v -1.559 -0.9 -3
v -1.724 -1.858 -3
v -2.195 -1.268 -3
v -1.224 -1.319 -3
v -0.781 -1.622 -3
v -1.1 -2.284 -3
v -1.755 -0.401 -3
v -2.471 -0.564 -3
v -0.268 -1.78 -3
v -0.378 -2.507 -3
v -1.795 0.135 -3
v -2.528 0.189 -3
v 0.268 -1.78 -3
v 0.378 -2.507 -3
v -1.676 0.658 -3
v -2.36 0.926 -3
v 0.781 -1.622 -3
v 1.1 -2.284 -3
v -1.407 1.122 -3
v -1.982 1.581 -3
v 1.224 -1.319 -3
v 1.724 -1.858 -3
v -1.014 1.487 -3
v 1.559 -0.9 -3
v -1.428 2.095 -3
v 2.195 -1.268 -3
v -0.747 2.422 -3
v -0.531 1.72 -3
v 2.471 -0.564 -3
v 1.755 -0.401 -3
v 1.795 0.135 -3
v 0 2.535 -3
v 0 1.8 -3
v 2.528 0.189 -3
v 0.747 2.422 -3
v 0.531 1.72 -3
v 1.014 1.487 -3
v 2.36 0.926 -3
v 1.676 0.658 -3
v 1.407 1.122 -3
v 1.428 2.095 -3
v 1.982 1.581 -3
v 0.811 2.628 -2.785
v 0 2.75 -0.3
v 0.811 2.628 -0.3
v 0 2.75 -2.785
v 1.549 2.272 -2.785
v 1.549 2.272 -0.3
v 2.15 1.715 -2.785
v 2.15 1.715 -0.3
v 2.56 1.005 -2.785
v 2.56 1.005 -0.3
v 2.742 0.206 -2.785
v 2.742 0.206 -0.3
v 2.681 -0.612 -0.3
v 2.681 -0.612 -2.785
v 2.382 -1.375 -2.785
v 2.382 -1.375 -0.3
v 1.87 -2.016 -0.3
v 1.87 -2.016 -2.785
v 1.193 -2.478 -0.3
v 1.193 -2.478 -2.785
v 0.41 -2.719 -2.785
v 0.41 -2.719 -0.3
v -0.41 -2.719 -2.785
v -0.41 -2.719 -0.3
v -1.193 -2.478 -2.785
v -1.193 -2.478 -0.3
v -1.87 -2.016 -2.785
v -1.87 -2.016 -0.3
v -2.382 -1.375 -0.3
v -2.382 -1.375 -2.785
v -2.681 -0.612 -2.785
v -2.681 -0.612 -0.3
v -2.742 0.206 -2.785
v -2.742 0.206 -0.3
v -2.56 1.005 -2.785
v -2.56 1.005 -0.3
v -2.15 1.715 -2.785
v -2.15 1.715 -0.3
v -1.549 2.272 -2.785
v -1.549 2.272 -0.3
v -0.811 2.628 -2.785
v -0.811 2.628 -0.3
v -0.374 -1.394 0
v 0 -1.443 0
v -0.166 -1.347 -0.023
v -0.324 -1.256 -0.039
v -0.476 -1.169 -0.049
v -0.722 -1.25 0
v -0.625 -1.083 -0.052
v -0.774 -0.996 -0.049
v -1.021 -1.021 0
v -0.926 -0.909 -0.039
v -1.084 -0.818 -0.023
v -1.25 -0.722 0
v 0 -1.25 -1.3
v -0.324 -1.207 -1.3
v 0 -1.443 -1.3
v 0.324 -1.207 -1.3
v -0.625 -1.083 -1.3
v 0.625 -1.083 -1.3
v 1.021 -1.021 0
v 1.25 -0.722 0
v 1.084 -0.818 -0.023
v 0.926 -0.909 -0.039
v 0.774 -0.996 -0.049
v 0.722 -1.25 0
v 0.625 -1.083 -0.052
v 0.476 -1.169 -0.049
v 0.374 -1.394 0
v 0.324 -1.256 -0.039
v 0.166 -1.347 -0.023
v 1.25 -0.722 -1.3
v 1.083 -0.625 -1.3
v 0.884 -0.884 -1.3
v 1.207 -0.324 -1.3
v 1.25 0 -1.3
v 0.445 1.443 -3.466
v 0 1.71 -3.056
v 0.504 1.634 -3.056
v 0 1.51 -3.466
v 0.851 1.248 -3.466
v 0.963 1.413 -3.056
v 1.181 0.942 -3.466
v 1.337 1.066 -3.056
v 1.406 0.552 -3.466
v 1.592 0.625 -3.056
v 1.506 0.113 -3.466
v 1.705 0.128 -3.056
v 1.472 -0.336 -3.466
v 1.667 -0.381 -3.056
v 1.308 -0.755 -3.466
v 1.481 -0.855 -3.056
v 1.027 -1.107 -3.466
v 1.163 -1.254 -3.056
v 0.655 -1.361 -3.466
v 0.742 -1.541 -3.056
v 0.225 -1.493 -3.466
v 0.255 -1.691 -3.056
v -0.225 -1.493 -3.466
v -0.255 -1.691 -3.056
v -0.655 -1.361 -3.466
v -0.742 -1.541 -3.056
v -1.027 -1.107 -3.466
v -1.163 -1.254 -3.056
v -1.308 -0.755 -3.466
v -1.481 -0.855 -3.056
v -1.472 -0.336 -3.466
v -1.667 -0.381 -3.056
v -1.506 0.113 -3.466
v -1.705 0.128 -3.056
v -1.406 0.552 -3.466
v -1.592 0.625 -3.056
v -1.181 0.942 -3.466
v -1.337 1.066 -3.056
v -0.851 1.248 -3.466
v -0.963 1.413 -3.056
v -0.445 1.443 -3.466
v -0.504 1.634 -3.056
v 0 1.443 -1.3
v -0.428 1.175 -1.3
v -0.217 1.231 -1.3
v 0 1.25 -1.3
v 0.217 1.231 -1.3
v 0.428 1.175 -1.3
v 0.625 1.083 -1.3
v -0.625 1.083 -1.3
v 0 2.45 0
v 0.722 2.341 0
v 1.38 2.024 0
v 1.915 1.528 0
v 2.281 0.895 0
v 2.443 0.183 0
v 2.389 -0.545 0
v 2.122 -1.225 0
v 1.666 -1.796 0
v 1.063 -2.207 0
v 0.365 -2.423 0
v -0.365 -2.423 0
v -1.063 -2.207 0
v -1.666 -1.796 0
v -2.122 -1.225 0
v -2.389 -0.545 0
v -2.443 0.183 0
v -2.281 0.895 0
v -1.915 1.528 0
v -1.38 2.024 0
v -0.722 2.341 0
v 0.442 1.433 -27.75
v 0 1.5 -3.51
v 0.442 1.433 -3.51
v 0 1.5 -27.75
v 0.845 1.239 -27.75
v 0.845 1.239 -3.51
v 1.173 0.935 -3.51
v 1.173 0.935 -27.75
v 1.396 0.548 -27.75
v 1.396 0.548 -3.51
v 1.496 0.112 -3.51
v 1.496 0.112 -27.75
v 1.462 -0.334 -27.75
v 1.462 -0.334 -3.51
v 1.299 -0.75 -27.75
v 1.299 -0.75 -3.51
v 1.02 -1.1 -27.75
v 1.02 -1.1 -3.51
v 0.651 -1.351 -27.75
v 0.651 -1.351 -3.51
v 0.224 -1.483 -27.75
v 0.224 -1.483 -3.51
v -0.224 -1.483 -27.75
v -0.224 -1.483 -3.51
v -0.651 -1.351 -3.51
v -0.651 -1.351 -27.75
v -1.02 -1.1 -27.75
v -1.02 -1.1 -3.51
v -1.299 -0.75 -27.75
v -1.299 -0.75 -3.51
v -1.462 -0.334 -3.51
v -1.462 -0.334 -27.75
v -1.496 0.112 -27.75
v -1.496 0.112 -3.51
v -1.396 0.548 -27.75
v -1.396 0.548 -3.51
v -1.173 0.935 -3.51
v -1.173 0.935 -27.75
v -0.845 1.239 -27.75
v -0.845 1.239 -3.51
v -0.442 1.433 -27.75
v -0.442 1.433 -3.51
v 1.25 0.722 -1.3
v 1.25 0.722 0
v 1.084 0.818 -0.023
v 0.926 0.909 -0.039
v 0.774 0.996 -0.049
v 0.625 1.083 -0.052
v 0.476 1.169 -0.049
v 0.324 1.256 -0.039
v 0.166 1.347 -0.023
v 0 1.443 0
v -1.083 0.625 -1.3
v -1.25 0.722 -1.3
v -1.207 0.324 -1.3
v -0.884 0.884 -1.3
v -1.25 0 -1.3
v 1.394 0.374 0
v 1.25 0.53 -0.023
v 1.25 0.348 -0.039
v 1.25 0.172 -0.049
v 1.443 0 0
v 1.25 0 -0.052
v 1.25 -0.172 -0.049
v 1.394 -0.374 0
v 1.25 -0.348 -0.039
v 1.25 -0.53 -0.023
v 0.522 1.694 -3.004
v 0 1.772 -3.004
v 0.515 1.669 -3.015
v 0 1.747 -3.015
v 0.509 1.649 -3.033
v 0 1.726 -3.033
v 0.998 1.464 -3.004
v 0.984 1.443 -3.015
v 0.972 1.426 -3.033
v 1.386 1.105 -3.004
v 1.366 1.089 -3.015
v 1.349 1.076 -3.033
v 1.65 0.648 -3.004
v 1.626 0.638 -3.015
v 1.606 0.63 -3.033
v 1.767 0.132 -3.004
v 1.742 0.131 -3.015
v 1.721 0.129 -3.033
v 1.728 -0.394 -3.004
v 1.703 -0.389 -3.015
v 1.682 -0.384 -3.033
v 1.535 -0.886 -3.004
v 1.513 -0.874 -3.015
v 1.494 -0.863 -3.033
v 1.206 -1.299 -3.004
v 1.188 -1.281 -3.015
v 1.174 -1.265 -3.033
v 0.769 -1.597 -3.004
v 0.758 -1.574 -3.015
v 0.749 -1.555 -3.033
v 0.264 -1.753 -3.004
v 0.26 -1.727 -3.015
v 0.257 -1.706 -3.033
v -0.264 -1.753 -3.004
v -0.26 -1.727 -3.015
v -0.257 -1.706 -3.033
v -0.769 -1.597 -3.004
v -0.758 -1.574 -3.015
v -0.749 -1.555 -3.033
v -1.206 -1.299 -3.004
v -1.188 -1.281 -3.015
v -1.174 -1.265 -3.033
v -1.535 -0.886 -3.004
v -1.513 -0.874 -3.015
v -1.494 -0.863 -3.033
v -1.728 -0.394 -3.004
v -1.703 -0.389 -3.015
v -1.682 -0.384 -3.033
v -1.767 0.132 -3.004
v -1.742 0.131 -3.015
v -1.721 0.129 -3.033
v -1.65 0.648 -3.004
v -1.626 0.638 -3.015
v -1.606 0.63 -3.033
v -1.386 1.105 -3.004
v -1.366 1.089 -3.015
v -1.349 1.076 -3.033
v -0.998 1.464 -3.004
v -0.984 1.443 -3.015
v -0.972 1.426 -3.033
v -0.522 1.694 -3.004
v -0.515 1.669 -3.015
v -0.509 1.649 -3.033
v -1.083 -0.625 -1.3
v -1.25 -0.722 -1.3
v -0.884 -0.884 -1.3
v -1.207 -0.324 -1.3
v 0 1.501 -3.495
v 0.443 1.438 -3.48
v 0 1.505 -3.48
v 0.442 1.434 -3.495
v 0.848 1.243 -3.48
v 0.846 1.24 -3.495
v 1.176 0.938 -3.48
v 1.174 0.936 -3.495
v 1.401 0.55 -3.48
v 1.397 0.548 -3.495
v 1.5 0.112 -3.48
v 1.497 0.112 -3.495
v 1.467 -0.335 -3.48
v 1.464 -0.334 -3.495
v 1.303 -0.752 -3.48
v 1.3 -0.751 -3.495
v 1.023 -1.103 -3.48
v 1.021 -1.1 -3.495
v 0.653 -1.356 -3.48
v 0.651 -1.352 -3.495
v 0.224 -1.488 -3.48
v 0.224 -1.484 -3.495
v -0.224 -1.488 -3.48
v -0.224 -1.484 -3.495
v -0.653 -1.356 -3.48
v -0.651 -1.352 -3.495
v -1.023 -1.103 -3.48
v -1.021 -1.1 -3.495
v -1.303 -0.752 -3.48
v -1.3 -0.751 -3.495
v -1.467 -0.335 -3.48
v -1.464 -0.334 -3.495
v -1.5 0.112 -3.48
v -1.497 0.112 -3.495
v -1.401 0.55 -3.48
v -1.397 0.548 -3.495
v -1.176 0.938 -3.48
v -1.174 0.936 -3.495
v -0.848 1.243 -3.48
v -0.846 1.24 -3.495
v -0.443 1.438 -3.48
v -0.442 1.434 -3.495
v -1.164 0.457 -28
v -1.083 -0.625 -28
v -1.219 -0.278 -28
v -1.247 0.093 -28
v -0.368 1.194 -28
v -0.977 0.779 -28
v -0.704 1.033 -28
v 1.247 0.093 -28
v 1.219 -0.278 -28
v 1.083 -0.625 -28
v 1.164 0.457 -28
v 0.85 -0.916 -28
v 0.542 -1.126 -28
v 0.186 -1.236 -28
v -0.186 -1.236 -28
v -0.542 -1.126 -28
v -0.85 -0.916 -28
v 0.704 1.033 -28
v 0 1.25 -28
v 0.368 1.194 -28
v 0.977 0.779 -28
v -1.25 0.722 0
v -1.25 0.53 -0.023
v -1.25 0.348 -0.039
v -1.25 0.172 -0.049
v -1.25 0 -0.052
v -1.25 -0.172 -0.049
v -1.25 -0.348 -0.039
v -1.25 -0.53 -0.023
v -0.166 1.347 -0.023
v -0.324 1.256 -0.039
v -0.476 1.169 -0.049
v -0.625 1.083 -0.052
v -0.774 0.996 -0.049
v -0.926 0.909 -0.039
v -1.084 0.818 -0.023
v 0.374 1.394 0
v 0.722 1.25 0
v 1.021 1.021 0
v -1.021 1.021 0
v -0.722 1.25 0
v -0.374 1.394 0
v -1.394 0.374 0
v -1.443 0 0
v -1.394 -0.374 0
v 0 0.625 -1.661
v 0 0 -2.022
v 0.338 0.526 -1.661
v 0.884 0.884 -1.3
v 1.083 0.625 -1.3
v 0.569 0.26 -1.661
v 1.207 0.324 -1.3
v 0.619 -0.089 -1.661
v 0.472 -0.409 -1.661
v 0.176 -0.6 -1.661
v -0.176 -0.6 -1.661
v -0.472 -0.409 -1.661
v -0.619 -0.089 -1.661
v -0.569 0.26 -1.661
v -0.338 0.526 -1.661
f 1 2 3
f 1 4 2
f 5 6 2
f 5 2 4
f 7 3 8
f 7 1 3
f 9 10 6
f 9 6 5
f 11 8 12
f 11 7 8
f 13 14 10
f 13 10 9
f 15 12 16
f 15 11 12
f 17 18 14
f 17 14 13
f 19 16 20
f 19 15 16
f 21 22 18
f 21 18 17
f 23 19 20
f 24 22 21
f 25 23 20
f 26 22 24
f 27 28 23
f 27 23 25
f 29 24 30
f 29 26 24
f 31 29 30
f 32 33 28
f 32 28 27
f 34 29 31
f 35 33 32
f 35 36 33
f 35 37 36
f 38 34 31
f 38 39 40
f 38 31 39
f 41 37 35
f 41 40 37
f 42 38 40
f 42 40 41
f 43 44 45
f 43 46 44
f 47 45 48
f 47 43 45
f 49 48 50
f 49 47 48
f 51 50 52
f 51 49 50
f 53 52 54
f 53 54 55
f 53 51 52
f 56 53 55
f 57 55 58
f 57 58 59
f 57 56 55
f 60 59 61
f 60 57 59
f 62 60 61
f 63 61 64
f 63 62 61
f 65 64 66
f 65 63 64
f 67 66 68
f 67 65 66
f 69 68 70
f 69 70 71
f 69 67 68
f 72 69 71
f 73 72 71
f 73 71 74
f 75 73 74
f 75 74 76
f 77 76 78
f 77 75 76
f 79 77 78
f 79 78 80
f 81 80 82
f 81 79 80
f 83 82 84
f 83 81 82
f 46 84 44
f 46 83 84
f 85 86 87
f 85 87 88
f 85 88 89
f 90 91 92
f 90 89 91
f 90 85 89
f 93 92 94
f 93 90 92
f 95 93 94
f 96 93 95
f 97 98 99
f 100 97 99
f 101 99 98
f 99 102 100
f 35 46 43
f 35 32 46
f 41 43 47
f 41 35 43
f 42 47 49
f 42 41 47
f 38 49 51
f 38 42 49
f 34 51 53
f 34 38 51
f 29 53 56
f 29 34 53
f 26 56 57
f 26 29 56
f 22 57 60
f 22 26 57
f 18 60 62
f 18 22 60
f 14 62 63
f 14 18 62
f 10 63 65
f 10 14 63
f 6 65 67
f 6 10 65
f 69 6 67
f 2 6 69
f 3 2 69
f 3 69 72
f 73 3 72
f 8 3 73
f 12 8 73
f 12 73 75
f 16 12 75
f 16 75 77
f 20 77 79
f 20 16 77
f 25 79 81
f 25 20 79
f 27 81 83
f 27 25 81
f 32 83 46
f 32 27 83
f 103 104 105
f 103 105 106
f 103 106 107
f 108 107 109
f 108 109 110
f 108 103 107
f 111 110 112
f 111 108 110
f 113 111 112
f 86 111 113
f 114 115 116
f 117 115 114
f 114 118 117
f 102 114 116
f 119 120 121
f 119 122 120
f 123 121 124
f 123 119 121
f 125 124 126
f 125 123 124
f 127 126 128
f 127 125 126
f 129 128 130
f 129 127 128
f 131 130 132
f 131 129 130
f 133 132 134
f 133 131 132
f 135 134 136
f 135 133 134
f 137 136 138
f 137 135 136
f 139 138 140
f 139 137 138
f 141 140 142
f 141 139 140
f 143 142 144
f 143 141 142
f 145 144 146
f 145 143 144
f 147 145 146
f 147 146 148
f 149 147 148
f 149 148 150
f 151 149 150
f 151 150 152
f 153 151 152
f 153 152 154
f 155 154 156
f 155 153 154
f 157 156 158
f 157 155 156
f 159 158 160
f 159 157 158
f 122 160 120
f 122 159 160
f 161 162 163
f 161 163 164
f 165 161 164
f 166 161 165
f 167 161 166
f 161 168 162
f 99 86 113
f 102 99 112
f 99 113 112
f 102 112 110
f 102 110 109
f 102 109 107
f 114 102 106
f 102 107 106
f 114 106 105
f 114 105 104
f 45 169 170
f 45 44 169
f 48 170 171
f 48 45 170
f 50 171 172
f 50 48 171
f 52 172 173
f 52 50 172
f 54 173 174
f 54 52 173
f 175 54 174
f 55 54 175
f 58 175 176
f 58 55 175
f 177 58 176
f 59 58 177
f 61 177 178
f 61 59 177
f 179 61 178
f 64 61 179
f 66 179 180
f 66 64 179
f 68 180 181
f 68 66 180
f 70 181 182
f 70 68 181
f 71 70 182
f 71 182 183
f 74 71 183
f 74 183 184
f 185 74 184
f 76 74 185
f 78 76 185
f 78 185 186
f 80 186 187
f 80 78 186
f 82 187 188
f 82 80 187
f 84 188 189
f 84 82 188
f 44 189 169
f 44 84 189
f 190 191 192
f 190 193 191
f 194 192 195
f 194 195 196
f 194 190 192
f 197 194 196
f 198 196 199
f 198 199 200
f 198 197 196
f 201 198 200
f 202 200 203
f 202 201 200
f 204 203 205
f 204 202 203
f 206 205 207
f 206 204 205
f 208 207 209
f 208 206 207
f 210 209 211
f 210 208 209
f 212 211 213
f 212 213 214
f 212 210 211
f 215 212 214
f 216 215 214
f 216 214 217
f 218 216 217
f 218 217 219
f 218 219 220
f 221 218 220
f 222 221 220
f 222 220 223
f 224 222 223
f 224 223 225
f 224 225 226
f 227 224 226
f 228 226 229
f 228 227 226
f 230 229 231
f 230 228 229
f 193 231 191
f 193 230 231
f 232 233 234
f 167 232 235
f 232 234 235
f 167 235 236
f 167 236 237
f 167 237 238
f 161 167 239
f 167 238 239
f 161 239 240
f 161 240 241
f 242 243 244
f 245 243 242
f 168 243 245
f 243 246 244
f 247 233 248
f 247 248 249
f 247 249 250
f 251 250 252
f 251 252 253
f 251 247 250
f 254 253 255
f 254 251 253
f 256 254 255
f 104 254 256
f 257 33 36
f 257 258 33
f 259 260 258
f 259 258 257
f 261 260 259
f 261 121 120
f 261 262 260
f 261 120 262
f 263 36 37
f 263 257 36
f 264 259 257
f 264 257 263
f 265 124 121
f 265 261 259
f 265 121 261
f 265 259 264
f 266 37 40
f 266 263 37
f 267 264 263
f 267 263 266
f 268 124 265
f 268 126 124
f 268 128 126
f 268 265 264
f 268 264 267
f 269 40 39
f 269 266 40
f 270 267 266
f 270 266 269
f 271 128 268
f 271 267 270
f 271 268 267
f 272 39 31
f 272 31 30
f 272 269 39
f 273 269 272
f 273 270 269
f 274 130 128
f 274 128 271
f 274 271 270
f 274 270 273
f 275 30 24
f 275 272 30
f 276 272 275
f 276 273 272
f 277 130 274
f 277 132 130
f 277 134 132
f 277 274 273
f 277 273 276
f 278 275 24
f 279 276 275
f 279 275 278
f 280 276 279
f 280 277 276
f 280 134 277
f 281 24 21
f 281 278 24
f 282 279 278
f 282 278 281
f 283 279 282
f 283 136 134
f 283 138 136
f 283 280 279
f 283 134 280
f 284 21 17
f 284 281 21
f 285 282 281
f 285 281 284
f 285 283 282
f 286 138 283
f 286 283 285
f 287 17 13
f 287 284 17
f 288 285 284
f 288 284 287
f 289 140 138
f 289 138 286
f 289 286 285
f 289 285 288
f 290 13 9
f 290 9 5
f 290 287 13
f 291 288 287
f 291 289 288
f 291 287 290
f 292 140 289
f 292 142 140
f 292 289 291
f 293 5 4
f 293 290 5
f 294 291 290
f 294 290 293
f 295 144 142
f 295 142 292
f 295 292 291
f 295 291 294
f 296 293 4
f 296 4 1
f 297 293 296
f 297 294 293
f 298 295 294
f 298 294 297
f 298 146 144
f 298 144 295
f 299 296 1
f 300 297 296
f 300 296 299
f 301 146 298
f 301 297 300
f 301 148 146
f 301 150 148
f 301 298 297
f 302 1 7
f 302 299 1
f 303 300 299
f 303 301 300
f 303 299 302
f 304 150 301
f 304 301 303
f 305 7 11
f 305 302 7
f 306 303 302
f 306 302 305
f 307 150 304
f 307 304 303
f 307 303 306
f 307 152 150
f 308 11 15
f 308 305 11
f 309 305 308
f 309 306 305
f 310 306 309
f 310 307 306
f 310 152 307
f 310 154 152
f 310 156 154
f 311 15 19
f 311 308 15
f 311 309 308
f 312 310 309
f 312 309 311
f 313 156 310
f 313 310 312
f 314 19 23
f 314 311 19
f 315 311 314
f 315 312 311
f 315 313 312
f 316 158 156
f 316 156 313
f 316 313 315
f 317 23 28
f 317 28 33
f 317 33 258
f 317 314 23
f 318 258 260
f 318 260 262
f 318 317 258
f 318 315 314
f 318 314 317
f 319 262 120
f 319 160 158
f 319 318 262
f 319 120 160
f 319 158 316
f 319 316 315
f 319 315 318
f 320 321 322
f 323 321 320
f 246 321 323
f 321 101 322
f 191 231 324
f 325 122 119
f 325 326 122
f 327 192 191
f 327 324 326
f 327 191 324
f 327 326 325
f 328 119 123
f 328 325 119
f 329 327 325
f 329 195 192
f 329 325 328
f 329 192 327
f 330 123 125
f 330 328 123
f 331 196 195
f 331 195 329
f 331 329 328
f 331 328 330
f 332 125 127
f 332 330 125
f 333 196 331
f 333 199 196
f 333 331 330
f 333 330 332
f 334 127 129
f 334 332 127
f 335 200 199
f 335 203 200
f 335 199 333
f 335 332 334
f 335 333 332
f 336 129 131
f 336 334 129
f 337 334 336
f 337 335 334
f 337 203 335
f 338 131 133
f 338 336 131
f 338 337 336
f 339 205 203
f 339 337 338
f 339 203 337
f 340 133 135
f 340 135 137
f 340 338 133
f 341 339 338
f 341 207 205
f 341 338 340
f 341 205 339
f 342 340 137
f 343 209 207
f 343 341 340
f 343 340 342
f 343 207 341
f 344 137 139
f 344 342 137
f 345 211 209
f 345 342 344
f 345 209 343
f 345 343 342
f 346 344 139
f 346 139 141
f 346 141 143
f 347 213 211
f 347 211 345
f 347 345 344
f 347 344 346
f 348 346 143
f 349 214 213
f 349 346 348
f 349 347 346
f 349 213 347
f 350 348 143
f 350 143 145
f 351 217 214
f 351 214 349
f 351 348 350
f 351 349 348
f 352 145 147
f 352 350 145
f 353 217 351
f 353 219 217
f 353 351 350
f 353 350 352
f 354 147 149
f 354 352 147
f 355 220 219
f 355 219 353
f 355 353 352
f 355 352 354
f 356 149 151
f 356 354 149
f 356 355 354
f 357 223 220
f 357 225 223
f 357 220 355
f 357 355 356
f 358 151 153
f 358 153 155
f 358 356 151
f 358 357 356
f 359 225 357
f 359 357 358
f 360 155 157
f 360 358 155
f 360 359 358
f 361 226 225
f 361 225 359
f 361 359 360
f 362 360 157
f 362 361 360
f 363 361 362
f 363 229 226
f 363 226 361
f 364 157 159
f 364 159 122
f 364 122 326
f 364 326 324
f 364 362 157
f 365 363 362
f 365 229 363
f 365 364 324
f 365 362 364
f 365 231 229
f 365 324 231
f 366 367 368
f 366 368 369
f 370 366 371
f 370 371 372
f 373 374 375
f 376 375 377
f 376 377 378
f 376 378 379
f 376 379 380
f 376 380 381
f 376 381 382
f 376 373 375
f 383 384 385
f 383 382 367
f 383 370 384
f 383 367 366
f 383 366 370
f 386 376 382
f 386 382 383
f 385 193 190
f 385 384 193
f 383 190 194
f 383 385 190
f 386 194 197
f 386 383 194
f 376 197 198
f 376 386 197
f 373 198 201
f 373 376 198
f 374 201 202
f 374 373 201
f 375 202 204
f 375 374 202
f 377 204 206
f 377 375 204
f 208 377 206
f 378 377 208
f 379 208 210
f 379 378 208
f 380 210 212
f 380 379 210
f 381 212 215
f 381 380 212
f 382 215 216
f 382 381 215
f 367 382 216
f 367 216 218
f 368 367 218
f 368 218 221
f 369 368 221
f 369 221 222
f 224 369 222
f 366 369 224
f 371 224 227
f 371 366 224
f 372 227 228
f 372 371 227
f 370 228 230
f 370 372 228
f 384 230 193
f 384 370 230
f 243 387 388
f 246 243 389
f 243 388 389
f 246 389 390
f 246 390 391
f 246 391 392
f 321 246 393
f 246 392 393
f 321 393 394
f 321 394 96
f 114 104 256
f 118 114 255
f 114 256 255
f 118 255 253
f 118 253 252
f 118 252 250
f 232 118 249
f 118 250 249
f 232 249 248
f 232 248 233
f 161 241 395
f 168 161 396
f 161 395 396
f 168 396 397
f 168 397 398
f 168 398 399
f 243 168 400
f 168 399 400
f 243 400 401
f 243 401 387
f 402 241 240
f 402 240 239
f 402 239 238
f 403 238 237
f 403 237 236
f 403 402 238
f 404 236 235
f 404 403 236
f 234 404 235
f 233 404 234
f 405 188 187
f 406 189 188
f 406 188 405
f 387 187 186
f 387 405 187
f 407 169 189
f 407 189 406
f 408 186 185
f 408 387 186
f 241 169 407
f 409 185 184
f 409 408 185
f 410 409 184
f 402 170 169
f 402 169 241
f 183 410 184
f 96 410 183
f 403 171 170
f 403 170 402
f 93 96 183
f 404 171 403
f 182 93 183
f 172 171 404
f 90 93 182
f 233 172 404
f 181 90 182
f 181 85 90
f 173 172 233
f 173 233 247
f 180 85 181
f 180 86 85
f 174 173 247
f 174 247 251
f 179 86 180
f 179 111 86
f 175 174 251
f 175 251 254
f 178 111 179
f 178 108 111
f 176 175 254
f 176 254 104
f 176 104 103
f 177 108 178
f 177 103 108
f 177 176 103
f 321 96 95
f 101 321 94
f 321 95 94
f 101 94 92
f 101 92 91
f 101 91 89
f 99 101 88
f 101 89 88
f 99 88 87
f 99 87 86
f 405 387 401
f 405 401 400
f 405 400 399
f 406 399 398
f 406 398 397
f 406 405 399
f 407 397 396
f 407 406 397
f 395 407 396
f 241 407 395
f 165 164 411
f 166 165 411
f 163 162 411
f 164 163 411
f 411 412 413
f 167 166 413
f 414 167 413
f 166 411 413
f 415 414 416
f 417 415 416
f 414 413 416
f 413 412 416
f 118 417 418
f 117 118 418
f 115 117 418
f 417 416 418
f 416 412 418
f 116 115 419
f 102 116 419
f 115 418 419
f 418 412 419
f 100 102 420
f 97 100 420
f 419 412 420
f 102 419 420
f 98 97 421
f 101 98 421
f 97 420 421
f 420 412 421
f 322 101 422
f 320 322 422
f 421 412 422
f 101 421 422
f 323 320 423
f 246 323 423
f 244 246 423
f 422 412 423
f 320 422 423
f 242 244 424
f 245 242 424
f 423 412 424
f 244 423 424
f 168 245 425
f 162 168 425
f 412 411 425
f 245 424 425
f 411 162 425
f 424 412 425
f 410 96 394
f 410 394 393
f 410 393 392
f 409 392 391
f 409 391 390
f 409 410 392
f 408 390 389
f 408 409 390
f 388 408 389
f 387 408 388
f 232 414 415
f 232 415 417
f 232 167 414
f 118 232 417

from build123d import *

# Parameters (mm, degrees)
CUT_EXTRUDE1_DEPTH = 1.3


with BuildPart() as part:
    # Sketch1 → Revolve1 (revolve)
    with BuildSketch(Plane(origin=(0, 0, 0), x_dir=(0, 0, -1), z_dir=(1, 0, 0))):
        with BuildLine():
            Line((0, 0), (0, 2.45))
            Line((0, 2.45), (0.3, 2.75))
            Line((0.3, 2.75), (2.785, 2.75))
            Line((2.785, 2.75), (3, 2.535))
            Line((3, 2.535), (3, 1.8))
            ThreePointArc((3, 1.8), (3.015193643, 1.74701055), (3.056157637, 1.710123155))
            Line((3.056157637, 1.710123155), (3.466157637, 1.510123155))
            ThreePointArc((3.466157637, 1.510123155), (3.48750205, 1.50256365), (3.51, 1.5))
            Line((3.51, 1.5), (27.75, 1.5))
            Line((27.75, 1.5), (28, 1.25))
            Line((28, 1.25), (28, 0))
            Line((28, 0), (0, 0))
        make_face()
    revolve(axis=Axis((0, 0, 0), (0, 0, -1)))

    # Sketch2 → Cut-Extrude1 (cut)
    with BuildSketch(Plane.XY):
        Polygon((0, 1.443375673), (-1.25, 0.721687836), (-1.25, -0.721687836), (0, -1.443375673), (1.25, -0.721687836), (1.25, 0.721687836), align=None)
    extrude(amount=-CUT_EXTRUDE1_DEPTH, mode=Mode.SUBTRACT)

    # Sketch3 → Cut-Revolve2 (revolve, cut)
    with BuildSketch(Plane(origin=(0, 0, 0), x_dir=(0, 0, -1), z_dir=(1, 0, 0))):
        Polygon((1.3, 0), (1.3, 1.25), (2.021687836, 0), align=None)
    revolve(axis=Axis((0, 0, -1.3), (0, 0, -1)), mode=Mode.SUBTRACT)

    # Sketch4 → Cut-Revolve3 (revolve, cut)
    with BuildSketch(Plane(origin=(0, 0, 0), x_dir=(0, 0, -1), z_dir=(1, 0, 0))):
        Polygon((0, 1.443375673), (0, 1.25), (0.051814855, 1.25), align=None)
    revolve(axis=Axis((0, 0, 0), (0, 0, -1)), mode=Mode.SUBTRACT)


solid = part.part
